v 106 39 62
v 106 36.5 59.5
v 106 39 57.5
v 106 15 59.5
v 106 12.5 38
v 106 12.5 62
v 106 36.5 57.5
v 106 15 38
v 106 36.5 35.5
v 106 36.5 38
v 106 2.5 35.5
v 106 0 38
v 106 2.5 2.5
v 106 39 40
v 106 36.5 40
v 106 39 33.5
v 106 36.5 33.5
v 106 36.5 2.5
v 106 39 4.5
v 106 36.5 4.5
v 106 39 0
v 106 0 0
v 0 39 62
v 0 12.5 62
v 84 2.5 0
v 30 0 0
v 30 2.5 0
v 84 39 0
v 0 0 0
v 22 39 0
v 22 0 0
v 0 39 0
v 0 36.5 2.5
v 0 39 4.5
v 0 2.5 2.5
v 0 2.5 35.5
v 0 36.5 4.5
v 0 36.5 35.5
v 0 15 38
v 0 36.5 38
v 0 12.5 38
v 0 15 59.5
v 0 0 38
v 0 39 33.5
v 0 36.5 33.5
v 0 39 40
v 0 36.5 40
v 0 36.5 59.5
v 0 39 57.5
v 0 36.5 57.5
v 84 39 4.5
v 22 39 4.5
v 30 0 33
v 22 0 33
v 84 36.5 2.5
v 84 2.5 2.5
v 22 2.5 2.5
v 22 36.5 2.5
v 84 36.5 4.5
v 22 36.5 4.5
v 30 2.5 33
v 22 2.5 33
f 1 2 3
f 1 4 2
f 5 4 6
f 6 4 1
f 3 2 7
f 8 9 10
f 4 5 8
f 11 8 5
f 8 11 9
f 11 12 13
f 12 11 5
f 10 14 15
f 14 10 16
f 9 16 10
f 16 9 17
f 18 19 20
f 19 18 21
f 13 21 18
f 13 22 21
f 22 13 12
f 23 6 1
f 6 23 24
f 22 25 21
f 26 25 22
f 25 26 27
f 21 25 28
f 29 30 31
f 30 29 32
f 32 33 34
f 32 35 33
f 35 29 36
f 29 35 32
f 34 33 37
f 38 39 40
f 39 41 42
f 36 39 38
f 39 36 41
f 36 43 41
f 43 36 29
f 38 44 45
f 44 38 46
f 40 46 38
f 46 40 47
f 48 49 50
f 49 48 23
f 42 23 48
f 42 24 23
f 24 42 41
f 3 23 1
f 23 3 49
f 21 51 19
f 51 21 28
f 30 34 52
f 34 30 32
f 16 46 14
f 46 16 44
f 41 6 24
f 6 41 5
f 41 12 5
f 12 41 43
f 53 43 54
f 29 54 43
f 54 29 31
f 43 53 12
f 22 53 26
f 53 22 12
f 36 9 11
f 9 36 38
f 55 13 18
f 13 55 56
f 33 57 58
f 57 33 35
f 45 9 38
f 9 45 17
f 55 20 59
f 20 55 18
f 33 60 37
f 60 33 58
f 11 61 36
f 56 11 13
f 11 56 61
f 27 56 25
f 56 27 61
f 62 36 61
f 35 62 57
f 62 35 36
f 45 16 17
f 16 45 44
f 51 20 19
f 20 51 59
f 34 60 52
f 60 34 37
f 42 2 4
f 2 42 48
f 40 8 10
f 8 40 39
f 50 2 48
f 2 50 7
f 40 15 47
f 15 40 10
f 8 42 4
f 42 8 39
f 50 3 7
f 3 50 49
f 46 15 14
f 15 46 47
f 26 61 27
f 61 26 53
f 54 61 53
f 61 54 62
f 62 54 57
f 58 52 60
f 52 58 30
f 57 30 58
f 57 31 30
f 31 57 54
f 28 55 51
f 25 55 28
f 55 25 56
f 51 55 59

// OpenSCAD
wall_thickness=2.5;
ledge_size = 2;

bar_thickness = 21.5;

camera_back_thickness = 29;
camera_front_thickness = 33;
camera_max_thickness = max(camera_back_thickness, camera_front_thickness);
camera_depth = 34;
camera_width = 106;
camera_holder_depth = camera_depth + wall_thickness * 2;
camera_holder_height = camera_max_thickness + wall_thickness;


holder_depth = bar_thickness + wall_thickness * 2;
holder_height = bar_thickness + (wall_thickness * 3) + camera_max_thickness;
holder_width = camera_width;
holder_opening_height = bar_thickness - ledge_size * 2;

fork_size = 22;

cable_indent = 32;

camera_bar_depth_delta = camera_depth - bar_thickness;

module fork_exclusion() {
    translate([fork_size, wall_thickness, 0]) {
        cube([holder_width - fork_size * 2, camera_depth + wall_thickness, camera_max_thickness]);
    }
}

module bar_exclusion() {

    translate([0, camera_bar_depth_delta, 0]) {
      union() {
          translate([0,wall_thickness,holder_height - bar_thickness - wall_thickness]) {
              cube([holder_width,bar_thickness,bar_thickness]);
              translate([0, bar_thickness, ledge_size]) {
                  cube([holder_width, wall_thickness, holder_opening_height]);
                  
              }
          }
      }
    }
}

module camera_exclusion() {
    union() {
        translate([0, wall_thickness, wall_thickness]) {
            cube([holder_width, camera_depth, camera_max_thickness]);
            translate([0, camera_depth, ledge_size]) {
                cube([holder_width, wall_thickness, camera_front_thickness - ledge_size * 2]);
            }
        }
    }
}

module cable_exclusion() {
  translate([22,0,0]) {
    cube([8,camera_depth,camera_max_thickness]);
  }
}

module base_cube() {
    union() {
        translate([0, camera_bar_depth_delta, 0]) {
            cube([holder_width,holder_depth,holder_height]);
        }
        cube([holder_width, camera_holder_depth, camera_holder_height + wall_thickness]);
    }
}

difference() {
    base_cube();
    camera_exclusion();
    cable_exclusion();
    bar_exclusion();
    fork_exclusion();
}
